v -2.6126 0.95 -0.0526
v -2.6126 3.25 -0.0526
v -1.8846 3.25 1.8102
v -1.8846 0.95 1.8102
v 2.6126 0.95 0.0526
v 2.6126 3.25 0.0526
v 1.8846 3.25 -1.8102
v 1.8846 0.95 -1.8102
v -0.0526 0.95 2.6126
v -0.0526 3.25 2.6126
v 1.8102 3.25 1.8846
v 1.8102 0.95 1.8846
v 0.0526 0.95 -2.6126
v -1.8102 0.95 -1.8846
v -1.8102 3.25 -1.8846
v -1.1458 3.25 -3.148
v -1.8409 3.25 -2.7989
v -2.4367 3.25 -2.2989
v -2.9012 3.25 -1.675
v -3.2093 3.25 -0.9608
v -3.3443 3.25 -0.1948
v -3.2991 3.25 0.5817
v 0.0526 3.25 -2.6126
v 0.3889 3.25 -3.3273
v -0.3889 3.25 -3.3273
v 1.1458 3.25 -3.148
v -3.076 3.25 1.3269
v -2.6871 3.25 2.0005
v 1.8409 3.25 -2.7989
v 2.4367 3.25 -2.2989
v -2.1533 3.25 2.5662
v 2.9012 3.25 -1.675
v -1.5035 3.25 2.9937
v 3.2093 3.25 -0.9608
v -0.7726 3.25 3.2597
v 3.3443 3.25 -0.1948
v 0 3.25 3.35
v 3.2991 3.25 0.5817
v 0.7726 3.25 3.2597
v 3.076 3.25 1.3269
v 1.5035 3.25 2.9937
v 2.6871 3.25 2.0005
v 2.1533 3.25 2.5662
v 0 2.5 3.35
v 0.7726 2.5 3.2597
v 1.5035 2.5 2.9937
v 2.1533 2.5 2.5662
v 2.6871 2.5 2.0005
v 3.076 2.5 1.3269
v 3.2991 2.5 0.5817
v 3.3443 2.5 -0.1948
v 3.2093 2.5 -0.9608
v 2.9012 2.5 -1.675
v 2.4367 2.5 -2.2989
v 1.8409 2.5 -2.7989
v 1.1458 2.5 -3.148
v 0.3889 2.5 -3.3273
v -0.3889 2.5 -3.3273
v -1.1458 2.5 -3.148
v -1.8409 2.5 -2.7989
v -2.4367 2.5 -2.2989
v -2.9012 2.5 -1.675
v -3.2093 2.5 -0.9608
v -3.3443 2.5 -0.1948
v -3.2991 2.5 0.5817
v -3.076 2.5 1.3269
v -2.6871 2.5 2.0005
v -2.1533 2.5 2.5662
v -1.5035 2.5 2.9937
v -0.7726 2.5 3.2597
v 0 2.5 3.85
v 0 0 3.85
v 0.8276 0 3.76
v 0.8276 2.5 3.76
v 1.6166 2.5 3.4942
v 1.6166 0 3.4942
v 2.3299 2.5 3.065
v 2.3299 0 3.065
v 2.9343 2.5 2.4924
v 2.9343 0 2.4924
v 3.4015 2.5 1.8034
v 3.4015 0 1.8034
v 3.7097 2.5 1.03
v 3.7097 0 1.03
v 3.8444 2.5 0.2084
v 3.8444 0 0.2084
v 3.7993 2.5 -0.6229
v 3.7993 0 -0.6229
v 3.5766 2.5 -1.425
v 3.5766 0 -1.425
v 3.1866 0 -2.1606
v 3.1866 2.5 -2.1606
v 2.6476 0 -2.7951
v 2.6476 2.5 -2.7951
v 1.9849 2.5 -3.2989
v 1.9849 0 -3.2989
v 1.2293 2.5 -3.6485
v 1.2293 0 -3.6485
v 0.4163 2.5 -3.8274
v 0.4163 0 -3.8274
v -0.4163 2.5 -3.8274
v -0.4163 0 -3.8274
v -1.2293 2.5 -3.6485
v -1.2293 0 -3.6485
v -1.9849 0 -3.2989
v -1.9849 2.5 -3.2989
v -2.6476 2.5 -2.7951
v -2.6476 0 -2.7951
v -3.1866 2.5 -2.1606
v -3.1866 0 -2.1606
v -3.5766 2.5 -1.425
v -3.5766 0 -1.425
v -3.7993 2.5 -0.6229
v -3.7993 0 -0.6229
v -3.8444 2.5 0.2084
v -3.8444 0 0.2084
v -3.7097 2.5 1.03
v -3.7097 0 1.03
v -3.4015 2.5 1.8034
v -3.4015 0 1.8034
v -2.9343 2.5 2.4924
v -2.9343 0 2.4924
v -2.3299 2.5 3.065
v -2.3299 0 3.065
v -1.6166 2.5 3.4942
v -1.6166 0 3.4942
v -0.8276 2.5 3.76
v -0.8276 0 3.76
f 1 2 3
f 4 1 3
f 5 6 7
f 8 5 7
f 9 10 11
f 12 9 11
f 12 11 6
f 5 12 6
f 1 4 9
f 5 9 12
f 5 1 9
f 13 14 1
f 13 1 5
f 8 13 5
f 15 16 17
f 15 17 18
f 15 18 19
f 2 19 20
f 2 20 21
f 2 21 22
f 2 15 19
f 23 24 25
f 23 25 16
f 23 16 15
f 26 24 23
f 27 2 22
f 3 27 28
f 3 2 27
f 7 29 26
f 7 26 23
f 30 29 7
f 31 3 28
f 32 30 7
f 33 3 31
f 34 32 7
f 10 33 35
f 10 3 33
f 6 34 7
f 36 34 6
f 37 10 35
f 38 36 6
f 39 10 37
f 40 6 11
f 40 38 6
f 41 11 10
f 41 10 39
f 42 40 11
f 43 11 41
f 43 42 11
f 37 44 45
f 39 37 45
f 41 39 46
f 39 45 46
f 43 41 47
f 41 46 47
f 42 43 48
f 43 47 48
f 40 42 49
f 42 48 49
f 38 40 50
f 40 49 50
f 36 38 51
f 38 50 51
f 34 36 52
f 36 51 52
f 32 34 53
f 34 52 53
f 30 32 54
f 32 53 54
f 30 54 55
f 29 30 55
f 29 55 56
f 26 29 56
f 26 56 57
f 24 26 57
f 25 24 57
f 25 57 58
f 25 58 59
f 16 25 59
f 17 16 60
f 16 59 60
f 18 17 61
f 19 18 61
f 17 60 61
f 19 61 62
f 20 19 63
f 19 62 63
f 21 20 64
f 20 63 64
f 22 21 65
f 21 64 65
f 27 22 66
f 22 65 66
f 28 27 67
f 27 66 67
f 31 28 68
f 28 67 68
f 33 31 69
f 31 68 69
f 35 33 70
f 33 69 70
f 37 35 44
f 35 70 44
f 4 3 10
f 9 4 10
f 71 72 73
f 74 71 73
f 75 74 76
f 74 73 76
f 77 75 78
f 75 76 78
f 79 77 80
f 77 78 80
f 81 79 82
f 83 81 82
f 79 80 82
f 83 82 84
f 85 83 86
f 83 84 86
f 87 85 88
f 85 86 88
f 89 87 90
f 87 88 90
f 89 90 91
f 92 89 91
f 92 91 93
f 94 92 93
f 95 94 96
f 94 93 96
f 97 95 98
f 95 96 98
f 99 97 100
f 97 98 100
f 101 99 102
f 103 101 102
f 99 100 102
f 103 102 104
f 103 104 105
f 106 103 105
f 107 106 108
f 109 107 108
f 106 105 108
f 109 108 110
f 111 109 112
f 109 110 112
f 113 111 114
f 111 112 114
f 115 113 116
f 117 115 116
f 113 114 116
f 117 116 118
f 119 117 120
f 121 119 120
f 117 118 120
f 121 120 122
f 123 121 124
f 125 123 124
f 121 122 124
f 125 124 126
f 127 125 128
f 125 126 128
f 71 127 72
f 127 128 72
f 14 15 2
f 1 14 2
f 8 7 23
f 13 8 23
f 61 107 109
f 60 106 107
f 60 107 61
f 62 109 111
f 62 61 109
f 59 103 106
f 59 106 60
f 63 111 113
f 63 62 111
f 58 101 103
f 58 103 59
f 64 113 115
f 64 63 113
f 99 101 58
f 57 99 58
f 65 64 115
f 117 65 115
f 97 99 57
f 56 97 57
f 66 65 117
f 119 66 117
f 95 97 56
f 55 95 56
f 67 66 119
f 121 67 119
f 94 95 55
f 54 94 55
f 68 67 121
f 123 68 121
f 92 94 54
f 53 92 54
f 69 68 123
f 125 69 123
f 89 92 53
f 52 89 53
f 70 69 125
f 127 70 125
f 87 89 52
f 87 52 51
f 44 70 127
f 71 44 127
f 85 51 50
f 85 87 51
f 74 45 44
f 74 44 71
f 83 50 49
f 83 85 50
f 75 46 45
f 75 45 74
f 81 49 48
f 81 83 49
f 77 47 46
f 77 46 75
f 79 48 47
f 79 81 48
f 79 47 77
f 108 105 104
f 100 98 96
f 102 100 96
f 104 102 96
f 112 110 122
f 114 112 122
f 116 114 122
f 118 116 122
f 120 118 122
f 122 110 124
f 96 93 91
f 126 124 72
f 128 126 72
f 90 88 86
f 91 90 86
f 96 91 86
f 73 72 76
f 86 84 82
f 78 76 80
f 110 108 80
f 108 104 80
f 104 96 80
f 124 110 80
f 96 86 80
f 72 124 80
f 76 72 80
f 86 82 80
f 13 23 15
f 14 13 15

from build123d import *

# Parameters (mm, degrees)
SKETCH1_R           = 3.85
BOSS_EXTRUDE1_DEPTH = 2.5
SKETCH2_R           = 3.35
BOSS_EXTRUDE2_DEPTH = 0.75
CUT_EXTRUDE1_DEPTH  = 2.3


with BuildPart() as part:
    # Sketch1 → Boss-Extrude1 (new body)
    with BuildSketch(Plane(origin=(0, 0, 0), x_dir=(1, 0, 0), z_dir=(0, 1, 0))):
        with Locations(Location((0, 0, 0), (0, 0, 270))):
            Circle(SKETCH1_R)
    extrude(amount=BOSS_EXTRUDE1_DEPTH)

    # Sketch2 → Boss-Extrude2 (add)
    with BuildSketch(Plane(origin=(0, 2.5, 0), x_dir=(1, 0, 0), z_dir=(0, 1, 0))):
        with Locations(Location((0, 0, 0), (0, 0, 270))):
            Circle(SKETCH2_R)
    extrude(amount=BOSS_EXTRUDE2_DEPTH)

    # Sketch3 → Cut-Extrude1 (cut)
    with BuildSketch(Plane(origin=(0, 3.25, 0), x_dir=(1, 0, 0), z_dir=(0, 1, 0))):
        Polygon((-0.052616599, -2.612596145), (1.810178897, -1.884590005), (2.612596145, -0.052616599), (1.884590005, 1.810178897), (0.052616599, 2.612596145), (-1.810178897, 1.884590005), (-2.612596145, 0.052616599), (-1.884590005, -1.810178897), align=None)
    extrude(amount=-CUT_EXTRUDE1_DEPTH, mode=Mode.SUBTRACT)


solid = part.part
